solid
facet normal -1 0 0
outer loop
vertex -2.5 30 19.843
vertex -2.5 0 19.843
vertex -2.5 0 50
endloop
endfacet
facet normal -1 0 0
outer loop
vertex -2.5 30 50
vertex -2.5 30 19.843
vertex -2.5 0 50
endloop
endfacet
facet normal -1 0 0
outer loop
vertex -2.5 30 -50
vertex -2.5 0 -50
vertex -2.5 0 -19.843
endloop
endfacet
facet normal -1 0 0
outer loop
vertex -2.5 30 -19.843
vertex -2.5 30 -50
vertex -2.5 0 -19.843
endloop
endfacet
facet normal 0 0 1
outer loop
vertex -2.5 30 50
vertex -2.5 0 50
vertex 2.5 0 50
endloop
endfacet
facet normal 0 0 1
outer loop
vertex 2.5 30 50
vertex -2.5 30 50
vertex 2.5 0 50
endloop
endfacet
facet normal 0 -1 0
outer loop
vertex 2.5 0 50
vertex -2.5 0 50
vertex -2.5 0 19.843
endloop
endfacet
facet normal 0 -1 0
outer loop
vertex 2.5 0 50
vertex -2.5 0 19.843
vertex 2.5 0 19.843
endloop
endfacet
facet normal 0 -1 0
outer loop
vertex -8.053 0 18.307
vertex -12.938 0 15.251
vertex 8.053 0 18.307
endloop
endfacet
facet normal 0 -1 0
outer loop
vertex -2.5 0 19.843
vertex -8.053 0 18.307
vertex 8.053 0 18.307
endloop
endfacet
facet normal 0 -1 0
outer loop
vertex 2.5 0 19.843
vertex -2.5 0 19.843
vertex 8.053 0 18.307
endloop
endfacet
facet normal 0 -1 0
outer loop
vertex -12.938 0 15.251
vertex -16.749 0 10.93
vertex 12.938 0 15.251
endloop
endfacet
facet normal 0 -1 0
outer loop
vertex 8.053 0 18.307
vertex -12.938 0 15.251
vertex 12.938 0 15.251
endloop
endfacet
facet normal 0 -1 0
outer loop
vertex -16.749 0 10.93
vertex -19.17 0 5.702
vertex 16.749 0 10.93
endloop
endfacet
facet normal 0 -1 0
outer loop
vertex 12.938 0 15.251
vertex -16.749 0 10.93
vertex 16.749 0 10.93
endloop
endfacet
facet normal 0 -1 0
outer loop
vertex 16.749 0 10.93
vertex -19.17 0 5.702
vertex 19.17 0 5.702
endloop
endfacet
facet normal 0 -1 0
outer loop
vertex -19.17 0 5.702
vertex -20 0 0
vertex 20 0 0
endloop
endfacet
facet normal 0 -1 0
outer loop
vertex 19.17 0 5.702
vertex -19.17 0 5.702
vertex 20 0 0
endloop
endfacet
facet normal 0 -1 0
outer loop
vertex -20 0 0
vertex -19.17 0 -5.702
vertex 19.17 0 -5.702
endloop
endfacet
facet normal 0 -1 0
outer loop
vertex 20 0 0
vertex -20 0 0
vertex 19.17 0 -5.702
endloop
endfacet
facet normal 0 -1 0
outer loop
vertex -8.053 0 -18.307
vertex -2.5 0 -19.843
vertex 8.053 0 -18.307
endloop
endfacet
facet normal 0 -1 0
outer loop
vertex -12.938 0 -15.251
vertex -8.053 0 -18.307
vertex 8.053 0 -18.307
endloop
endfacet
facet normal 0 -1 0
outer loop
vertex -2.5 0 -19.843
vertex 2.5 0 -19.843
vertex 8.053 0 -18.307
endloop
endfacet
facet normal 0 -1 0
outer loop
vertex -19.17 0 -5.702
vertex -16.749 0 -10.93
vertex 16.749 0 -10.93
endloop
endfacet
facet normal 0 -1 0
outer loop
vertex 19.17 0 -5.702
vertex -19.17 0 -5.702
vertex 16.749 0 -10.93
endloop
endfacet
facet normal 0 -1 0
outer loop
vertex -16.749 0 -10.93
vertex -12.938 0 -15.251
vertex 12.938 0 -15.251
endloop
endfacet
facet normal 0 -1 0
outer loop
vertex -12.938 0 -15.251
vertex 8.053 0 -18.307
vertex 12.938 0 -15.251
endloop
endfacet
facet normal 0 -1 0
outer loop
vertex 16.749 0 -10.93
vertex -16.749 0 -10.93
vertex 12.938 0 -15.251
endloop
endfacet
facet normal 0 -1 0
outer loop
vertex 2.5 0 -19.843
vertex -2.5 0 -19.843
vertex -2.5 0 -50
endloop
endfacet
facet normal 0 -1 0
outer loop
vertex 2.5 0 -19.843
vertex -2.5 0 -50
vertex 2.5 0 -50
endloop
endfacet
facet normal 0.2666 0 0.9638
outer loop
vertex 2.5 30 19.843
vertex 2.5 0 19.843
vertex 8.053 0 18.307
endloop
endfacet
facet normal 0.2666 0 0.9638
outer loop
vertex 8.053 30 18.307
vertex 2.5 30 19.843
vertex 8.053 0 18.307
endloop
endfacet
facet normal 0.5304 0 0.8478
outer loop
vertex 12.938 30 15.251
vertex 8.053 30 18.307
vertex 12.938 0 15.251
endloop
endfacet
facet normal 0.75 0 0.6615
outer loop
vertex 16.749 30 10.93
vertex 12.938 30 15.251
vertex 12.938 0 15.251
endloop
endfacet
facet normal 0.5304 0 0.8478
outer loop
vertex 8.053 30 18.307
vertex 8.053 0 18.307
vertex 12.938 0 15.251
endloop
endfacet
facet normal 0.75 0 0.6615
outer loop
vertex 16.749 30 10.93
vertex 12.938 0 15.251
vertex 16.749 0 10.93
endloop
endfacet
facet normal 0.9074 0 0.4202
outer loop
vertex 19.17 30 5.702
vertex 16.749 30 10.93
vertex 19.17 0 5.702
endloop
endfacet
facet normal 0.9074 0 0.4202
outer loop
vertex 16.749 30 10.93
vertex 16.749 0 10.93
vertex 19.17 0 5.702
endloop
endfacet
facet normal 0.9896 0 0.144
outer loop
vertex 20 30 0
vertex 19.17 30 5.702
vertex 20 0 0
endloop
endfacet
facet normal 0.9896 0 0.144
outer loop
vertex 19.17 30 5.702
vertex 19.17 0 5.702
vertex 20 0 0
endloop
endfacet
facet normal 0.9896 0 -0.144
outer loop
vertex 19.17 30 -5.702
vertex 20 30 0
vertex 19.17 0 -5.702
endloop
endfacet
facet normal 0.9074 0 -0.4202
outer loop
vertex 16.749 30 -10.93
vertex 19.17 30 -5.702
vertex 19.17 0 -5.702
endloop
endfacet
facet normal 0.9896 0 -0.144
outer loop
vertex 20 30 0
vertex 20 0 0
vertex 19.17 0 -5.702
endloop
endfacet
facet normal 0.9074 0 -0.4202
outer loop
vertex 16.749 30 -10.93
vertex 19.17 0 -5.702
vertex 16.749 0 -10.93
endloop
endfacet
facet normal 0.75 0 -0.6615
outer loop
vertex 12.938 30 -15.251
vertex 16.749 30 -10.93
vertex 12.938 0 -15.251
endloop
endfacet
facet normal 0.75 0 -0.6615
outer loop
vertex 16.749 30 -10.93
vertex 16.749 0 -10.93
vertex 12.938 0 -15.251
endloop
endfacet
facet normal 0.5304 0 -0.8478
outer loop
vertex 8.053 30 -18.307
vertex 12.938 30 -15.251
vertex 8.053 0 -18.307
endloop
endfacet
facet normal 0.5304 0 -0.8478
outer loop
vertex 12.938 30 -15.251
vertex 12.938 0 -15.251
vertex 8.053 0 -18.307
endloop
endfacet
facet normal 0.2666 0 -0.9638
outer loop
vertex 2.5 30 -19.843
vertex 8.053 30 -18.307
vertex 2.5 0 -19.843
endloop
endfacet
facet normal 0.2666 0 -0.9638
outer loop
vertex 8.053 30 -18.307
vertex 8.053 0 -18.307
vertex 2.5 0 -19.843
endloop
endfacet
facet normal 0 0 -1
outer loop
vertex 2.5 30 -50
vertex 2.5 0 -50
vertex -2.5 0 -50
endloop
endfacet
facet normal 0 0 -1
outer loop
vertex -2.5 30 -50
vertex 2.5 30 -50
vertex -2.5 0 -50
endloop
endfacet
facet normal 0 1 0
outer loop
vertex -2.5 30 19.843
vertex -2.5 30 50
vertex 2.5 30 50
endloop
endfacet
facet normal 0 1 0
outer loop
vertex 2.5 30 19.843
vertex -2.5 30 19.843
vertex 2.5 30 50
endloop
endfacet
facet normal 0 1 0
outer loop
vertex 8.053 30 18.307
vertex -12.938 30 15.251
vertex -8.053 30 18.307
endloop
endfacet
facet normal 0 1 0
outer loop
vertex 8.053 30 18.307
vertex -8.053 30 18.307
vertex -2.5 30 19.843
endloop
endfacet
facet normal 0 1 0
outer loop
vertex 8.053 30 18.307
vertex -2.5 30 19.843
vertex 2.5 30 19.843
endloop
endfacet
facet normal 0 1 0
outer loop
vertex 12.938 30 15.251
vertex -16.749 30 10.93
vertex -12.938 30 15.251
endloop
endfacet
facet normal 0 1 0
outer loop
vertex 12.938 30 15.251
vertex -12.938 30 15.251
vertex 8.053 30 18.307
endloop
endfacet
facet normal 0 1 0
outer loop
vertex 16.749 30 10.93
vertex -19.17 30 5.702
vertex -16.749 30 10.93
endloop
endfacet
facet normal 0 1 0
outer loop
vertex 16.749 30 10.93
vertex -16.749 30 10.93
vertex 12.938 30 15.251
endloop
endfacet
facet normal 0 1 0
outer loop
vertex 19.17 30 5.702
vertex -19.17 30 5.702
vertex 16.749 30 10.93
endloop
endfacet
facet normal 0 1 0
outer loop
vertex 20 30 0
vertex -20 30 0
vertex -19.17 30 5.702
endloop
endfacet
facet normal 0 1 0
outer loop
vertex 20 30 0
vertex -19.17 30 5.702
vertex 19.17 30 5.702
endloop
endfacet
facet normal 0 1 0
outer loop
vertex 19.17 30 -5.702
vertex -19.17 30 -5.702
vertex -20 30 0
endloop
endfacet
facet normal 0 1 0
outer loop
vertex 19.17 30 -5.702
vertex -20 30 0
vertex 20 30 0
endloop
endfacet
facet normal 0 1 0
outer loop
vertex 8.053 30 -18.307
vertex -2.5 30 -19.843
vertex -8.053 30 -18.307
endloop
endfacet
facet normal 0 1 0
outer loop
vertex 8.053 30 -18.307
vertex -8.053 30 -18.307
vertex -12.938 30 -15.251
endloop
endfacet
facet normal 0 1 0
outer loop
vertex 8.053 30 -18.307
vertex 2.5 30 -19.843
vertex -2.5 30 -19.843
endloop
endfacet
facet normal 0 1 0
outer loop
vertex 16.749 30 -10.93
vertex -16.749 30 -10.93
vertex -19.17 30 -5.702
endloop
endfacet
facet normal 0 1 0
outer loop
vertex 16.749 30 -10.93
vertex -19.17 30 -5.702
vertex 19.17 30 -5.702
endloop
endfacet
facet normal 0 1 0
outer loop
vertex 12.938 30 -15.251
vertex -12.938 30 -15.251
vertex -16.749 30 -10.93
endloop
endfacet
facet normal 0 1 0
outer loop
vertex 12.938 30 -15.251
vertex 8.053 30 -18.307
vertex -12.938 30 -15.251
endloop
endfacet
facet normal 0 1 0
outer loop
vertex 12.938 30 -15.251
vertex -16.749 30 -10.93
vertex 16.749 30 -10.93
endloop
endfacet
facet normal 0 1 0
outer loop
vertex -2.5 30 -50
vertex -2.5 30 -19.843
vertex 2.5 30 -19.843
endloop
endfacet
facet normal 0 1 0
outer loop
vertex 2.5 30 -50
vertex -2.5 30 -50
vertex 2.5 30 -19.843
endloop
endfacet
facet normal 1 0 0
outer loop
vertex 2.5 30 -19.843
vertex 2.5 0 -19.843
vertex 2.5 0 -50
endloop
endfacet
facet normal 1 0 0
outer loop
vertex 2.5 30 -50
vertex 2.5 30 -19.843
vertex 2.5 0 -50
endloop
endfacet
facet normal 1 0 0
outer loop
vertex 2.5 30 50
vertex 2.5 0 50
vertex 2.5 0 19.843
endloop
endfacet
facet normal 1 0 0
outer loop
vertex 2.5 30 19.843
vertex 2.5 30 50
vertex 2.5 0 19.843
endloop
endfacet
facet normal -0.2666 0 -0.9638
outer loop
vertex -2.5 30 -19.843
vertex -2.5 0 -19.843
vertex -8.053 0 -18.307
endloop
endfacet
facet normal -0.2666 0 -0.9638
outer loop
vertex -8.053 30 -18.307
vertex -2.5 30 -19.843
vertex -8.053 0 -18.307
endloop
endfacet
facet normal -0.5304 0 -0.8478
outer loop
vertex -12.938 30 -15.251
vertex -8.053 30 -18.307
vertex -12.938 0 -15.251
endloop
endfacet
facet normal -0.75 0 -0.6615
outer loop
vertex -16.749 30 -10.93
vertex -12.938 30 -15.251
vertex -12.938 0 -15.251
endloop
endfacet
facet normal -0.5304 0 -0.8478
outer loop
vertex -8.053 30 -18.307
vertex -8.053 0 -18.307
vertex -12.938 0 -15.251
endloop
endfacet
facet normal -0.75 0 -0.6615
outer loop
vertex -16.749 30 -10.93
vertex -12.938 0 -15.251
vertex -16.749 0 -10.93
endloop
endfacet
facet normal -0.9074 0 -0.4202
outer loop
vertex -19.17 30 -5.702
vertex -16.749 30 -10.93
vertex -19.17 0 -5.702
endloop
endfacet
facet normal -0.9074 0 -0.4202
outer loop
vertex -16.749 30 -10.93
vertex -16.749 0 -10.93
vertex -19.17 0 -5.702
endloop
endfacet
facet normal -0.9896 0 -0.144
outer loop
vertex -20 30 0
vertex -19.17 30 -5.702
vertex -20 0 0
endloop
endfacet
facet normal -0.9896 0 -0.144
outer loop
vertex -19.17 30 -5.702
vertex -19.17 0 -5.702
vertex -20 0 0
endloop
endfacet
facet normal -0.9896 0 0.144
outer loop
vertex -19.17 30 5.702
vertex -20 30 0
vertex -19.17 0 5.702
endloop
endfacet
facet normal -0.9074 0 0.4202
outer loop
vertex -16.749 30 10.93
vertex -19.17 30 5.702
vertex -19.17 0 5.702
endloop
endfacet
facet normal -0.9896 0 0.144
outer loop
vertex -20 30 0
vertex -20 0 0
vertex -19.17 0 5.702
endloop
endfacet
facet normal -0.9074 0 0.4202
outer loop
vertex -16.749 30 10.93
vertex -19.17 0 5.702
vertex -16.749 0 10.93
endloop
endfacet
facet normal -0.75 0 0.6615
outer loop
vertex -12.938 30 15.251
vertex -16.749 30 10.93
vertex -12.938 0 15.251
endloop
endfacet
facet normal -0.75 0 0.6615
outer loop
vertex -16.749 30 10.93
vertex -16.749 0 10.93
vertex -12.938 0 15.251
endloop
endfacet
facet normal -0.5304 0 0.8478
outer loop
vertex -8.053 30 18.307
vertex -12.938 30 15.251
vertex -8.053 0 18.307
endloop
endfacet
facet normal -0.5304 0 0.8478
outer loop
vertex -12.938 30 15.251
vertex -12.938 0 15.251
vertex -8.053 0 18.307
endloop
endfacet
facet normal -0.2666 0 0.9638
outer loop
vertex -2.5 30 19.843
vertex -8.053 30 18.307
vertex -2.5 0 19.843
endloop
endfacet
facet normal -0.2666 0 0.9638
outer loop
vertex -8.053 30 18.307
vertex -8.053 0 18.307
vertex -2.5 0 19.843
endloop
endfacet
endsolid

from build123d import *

# Parameters (mm, degrees)
EXTRUDE_1_DEPTH = 30


with BuildPart() as part:
    # 草图1 → 凸台-拉伸1 (new body)
    with BuildSketch(Plane(origin=(0, 0, 0), x_dir=(1, 0, 0), z_dir=(0, 1, 0))):
        with BuildLine():
            Line((-2.5, 50), (-2.5, 19.843134833))
            ThreePointArc((-2.5, 19.843134833), (-20, 0), (-2.5, -19.843134833))
            Line((-2.5, -19.843134833), (-2.5, -50))
            Line((-2.5, -50), (2.5, -50))
            Line((2.5, -50), (2.5, -19.843134833))
            ThreePointArc((2.5, -19.843134833), (20, 0), (2.5, 19.843134833))
            Line((2.5, 19.843134833), (2.5, 50))
            Line((2.5, 50), (-2.5, 50))
        make_face()
    extrude(amount=EXTRUDE_1_DEPTH)


solid = part.part
